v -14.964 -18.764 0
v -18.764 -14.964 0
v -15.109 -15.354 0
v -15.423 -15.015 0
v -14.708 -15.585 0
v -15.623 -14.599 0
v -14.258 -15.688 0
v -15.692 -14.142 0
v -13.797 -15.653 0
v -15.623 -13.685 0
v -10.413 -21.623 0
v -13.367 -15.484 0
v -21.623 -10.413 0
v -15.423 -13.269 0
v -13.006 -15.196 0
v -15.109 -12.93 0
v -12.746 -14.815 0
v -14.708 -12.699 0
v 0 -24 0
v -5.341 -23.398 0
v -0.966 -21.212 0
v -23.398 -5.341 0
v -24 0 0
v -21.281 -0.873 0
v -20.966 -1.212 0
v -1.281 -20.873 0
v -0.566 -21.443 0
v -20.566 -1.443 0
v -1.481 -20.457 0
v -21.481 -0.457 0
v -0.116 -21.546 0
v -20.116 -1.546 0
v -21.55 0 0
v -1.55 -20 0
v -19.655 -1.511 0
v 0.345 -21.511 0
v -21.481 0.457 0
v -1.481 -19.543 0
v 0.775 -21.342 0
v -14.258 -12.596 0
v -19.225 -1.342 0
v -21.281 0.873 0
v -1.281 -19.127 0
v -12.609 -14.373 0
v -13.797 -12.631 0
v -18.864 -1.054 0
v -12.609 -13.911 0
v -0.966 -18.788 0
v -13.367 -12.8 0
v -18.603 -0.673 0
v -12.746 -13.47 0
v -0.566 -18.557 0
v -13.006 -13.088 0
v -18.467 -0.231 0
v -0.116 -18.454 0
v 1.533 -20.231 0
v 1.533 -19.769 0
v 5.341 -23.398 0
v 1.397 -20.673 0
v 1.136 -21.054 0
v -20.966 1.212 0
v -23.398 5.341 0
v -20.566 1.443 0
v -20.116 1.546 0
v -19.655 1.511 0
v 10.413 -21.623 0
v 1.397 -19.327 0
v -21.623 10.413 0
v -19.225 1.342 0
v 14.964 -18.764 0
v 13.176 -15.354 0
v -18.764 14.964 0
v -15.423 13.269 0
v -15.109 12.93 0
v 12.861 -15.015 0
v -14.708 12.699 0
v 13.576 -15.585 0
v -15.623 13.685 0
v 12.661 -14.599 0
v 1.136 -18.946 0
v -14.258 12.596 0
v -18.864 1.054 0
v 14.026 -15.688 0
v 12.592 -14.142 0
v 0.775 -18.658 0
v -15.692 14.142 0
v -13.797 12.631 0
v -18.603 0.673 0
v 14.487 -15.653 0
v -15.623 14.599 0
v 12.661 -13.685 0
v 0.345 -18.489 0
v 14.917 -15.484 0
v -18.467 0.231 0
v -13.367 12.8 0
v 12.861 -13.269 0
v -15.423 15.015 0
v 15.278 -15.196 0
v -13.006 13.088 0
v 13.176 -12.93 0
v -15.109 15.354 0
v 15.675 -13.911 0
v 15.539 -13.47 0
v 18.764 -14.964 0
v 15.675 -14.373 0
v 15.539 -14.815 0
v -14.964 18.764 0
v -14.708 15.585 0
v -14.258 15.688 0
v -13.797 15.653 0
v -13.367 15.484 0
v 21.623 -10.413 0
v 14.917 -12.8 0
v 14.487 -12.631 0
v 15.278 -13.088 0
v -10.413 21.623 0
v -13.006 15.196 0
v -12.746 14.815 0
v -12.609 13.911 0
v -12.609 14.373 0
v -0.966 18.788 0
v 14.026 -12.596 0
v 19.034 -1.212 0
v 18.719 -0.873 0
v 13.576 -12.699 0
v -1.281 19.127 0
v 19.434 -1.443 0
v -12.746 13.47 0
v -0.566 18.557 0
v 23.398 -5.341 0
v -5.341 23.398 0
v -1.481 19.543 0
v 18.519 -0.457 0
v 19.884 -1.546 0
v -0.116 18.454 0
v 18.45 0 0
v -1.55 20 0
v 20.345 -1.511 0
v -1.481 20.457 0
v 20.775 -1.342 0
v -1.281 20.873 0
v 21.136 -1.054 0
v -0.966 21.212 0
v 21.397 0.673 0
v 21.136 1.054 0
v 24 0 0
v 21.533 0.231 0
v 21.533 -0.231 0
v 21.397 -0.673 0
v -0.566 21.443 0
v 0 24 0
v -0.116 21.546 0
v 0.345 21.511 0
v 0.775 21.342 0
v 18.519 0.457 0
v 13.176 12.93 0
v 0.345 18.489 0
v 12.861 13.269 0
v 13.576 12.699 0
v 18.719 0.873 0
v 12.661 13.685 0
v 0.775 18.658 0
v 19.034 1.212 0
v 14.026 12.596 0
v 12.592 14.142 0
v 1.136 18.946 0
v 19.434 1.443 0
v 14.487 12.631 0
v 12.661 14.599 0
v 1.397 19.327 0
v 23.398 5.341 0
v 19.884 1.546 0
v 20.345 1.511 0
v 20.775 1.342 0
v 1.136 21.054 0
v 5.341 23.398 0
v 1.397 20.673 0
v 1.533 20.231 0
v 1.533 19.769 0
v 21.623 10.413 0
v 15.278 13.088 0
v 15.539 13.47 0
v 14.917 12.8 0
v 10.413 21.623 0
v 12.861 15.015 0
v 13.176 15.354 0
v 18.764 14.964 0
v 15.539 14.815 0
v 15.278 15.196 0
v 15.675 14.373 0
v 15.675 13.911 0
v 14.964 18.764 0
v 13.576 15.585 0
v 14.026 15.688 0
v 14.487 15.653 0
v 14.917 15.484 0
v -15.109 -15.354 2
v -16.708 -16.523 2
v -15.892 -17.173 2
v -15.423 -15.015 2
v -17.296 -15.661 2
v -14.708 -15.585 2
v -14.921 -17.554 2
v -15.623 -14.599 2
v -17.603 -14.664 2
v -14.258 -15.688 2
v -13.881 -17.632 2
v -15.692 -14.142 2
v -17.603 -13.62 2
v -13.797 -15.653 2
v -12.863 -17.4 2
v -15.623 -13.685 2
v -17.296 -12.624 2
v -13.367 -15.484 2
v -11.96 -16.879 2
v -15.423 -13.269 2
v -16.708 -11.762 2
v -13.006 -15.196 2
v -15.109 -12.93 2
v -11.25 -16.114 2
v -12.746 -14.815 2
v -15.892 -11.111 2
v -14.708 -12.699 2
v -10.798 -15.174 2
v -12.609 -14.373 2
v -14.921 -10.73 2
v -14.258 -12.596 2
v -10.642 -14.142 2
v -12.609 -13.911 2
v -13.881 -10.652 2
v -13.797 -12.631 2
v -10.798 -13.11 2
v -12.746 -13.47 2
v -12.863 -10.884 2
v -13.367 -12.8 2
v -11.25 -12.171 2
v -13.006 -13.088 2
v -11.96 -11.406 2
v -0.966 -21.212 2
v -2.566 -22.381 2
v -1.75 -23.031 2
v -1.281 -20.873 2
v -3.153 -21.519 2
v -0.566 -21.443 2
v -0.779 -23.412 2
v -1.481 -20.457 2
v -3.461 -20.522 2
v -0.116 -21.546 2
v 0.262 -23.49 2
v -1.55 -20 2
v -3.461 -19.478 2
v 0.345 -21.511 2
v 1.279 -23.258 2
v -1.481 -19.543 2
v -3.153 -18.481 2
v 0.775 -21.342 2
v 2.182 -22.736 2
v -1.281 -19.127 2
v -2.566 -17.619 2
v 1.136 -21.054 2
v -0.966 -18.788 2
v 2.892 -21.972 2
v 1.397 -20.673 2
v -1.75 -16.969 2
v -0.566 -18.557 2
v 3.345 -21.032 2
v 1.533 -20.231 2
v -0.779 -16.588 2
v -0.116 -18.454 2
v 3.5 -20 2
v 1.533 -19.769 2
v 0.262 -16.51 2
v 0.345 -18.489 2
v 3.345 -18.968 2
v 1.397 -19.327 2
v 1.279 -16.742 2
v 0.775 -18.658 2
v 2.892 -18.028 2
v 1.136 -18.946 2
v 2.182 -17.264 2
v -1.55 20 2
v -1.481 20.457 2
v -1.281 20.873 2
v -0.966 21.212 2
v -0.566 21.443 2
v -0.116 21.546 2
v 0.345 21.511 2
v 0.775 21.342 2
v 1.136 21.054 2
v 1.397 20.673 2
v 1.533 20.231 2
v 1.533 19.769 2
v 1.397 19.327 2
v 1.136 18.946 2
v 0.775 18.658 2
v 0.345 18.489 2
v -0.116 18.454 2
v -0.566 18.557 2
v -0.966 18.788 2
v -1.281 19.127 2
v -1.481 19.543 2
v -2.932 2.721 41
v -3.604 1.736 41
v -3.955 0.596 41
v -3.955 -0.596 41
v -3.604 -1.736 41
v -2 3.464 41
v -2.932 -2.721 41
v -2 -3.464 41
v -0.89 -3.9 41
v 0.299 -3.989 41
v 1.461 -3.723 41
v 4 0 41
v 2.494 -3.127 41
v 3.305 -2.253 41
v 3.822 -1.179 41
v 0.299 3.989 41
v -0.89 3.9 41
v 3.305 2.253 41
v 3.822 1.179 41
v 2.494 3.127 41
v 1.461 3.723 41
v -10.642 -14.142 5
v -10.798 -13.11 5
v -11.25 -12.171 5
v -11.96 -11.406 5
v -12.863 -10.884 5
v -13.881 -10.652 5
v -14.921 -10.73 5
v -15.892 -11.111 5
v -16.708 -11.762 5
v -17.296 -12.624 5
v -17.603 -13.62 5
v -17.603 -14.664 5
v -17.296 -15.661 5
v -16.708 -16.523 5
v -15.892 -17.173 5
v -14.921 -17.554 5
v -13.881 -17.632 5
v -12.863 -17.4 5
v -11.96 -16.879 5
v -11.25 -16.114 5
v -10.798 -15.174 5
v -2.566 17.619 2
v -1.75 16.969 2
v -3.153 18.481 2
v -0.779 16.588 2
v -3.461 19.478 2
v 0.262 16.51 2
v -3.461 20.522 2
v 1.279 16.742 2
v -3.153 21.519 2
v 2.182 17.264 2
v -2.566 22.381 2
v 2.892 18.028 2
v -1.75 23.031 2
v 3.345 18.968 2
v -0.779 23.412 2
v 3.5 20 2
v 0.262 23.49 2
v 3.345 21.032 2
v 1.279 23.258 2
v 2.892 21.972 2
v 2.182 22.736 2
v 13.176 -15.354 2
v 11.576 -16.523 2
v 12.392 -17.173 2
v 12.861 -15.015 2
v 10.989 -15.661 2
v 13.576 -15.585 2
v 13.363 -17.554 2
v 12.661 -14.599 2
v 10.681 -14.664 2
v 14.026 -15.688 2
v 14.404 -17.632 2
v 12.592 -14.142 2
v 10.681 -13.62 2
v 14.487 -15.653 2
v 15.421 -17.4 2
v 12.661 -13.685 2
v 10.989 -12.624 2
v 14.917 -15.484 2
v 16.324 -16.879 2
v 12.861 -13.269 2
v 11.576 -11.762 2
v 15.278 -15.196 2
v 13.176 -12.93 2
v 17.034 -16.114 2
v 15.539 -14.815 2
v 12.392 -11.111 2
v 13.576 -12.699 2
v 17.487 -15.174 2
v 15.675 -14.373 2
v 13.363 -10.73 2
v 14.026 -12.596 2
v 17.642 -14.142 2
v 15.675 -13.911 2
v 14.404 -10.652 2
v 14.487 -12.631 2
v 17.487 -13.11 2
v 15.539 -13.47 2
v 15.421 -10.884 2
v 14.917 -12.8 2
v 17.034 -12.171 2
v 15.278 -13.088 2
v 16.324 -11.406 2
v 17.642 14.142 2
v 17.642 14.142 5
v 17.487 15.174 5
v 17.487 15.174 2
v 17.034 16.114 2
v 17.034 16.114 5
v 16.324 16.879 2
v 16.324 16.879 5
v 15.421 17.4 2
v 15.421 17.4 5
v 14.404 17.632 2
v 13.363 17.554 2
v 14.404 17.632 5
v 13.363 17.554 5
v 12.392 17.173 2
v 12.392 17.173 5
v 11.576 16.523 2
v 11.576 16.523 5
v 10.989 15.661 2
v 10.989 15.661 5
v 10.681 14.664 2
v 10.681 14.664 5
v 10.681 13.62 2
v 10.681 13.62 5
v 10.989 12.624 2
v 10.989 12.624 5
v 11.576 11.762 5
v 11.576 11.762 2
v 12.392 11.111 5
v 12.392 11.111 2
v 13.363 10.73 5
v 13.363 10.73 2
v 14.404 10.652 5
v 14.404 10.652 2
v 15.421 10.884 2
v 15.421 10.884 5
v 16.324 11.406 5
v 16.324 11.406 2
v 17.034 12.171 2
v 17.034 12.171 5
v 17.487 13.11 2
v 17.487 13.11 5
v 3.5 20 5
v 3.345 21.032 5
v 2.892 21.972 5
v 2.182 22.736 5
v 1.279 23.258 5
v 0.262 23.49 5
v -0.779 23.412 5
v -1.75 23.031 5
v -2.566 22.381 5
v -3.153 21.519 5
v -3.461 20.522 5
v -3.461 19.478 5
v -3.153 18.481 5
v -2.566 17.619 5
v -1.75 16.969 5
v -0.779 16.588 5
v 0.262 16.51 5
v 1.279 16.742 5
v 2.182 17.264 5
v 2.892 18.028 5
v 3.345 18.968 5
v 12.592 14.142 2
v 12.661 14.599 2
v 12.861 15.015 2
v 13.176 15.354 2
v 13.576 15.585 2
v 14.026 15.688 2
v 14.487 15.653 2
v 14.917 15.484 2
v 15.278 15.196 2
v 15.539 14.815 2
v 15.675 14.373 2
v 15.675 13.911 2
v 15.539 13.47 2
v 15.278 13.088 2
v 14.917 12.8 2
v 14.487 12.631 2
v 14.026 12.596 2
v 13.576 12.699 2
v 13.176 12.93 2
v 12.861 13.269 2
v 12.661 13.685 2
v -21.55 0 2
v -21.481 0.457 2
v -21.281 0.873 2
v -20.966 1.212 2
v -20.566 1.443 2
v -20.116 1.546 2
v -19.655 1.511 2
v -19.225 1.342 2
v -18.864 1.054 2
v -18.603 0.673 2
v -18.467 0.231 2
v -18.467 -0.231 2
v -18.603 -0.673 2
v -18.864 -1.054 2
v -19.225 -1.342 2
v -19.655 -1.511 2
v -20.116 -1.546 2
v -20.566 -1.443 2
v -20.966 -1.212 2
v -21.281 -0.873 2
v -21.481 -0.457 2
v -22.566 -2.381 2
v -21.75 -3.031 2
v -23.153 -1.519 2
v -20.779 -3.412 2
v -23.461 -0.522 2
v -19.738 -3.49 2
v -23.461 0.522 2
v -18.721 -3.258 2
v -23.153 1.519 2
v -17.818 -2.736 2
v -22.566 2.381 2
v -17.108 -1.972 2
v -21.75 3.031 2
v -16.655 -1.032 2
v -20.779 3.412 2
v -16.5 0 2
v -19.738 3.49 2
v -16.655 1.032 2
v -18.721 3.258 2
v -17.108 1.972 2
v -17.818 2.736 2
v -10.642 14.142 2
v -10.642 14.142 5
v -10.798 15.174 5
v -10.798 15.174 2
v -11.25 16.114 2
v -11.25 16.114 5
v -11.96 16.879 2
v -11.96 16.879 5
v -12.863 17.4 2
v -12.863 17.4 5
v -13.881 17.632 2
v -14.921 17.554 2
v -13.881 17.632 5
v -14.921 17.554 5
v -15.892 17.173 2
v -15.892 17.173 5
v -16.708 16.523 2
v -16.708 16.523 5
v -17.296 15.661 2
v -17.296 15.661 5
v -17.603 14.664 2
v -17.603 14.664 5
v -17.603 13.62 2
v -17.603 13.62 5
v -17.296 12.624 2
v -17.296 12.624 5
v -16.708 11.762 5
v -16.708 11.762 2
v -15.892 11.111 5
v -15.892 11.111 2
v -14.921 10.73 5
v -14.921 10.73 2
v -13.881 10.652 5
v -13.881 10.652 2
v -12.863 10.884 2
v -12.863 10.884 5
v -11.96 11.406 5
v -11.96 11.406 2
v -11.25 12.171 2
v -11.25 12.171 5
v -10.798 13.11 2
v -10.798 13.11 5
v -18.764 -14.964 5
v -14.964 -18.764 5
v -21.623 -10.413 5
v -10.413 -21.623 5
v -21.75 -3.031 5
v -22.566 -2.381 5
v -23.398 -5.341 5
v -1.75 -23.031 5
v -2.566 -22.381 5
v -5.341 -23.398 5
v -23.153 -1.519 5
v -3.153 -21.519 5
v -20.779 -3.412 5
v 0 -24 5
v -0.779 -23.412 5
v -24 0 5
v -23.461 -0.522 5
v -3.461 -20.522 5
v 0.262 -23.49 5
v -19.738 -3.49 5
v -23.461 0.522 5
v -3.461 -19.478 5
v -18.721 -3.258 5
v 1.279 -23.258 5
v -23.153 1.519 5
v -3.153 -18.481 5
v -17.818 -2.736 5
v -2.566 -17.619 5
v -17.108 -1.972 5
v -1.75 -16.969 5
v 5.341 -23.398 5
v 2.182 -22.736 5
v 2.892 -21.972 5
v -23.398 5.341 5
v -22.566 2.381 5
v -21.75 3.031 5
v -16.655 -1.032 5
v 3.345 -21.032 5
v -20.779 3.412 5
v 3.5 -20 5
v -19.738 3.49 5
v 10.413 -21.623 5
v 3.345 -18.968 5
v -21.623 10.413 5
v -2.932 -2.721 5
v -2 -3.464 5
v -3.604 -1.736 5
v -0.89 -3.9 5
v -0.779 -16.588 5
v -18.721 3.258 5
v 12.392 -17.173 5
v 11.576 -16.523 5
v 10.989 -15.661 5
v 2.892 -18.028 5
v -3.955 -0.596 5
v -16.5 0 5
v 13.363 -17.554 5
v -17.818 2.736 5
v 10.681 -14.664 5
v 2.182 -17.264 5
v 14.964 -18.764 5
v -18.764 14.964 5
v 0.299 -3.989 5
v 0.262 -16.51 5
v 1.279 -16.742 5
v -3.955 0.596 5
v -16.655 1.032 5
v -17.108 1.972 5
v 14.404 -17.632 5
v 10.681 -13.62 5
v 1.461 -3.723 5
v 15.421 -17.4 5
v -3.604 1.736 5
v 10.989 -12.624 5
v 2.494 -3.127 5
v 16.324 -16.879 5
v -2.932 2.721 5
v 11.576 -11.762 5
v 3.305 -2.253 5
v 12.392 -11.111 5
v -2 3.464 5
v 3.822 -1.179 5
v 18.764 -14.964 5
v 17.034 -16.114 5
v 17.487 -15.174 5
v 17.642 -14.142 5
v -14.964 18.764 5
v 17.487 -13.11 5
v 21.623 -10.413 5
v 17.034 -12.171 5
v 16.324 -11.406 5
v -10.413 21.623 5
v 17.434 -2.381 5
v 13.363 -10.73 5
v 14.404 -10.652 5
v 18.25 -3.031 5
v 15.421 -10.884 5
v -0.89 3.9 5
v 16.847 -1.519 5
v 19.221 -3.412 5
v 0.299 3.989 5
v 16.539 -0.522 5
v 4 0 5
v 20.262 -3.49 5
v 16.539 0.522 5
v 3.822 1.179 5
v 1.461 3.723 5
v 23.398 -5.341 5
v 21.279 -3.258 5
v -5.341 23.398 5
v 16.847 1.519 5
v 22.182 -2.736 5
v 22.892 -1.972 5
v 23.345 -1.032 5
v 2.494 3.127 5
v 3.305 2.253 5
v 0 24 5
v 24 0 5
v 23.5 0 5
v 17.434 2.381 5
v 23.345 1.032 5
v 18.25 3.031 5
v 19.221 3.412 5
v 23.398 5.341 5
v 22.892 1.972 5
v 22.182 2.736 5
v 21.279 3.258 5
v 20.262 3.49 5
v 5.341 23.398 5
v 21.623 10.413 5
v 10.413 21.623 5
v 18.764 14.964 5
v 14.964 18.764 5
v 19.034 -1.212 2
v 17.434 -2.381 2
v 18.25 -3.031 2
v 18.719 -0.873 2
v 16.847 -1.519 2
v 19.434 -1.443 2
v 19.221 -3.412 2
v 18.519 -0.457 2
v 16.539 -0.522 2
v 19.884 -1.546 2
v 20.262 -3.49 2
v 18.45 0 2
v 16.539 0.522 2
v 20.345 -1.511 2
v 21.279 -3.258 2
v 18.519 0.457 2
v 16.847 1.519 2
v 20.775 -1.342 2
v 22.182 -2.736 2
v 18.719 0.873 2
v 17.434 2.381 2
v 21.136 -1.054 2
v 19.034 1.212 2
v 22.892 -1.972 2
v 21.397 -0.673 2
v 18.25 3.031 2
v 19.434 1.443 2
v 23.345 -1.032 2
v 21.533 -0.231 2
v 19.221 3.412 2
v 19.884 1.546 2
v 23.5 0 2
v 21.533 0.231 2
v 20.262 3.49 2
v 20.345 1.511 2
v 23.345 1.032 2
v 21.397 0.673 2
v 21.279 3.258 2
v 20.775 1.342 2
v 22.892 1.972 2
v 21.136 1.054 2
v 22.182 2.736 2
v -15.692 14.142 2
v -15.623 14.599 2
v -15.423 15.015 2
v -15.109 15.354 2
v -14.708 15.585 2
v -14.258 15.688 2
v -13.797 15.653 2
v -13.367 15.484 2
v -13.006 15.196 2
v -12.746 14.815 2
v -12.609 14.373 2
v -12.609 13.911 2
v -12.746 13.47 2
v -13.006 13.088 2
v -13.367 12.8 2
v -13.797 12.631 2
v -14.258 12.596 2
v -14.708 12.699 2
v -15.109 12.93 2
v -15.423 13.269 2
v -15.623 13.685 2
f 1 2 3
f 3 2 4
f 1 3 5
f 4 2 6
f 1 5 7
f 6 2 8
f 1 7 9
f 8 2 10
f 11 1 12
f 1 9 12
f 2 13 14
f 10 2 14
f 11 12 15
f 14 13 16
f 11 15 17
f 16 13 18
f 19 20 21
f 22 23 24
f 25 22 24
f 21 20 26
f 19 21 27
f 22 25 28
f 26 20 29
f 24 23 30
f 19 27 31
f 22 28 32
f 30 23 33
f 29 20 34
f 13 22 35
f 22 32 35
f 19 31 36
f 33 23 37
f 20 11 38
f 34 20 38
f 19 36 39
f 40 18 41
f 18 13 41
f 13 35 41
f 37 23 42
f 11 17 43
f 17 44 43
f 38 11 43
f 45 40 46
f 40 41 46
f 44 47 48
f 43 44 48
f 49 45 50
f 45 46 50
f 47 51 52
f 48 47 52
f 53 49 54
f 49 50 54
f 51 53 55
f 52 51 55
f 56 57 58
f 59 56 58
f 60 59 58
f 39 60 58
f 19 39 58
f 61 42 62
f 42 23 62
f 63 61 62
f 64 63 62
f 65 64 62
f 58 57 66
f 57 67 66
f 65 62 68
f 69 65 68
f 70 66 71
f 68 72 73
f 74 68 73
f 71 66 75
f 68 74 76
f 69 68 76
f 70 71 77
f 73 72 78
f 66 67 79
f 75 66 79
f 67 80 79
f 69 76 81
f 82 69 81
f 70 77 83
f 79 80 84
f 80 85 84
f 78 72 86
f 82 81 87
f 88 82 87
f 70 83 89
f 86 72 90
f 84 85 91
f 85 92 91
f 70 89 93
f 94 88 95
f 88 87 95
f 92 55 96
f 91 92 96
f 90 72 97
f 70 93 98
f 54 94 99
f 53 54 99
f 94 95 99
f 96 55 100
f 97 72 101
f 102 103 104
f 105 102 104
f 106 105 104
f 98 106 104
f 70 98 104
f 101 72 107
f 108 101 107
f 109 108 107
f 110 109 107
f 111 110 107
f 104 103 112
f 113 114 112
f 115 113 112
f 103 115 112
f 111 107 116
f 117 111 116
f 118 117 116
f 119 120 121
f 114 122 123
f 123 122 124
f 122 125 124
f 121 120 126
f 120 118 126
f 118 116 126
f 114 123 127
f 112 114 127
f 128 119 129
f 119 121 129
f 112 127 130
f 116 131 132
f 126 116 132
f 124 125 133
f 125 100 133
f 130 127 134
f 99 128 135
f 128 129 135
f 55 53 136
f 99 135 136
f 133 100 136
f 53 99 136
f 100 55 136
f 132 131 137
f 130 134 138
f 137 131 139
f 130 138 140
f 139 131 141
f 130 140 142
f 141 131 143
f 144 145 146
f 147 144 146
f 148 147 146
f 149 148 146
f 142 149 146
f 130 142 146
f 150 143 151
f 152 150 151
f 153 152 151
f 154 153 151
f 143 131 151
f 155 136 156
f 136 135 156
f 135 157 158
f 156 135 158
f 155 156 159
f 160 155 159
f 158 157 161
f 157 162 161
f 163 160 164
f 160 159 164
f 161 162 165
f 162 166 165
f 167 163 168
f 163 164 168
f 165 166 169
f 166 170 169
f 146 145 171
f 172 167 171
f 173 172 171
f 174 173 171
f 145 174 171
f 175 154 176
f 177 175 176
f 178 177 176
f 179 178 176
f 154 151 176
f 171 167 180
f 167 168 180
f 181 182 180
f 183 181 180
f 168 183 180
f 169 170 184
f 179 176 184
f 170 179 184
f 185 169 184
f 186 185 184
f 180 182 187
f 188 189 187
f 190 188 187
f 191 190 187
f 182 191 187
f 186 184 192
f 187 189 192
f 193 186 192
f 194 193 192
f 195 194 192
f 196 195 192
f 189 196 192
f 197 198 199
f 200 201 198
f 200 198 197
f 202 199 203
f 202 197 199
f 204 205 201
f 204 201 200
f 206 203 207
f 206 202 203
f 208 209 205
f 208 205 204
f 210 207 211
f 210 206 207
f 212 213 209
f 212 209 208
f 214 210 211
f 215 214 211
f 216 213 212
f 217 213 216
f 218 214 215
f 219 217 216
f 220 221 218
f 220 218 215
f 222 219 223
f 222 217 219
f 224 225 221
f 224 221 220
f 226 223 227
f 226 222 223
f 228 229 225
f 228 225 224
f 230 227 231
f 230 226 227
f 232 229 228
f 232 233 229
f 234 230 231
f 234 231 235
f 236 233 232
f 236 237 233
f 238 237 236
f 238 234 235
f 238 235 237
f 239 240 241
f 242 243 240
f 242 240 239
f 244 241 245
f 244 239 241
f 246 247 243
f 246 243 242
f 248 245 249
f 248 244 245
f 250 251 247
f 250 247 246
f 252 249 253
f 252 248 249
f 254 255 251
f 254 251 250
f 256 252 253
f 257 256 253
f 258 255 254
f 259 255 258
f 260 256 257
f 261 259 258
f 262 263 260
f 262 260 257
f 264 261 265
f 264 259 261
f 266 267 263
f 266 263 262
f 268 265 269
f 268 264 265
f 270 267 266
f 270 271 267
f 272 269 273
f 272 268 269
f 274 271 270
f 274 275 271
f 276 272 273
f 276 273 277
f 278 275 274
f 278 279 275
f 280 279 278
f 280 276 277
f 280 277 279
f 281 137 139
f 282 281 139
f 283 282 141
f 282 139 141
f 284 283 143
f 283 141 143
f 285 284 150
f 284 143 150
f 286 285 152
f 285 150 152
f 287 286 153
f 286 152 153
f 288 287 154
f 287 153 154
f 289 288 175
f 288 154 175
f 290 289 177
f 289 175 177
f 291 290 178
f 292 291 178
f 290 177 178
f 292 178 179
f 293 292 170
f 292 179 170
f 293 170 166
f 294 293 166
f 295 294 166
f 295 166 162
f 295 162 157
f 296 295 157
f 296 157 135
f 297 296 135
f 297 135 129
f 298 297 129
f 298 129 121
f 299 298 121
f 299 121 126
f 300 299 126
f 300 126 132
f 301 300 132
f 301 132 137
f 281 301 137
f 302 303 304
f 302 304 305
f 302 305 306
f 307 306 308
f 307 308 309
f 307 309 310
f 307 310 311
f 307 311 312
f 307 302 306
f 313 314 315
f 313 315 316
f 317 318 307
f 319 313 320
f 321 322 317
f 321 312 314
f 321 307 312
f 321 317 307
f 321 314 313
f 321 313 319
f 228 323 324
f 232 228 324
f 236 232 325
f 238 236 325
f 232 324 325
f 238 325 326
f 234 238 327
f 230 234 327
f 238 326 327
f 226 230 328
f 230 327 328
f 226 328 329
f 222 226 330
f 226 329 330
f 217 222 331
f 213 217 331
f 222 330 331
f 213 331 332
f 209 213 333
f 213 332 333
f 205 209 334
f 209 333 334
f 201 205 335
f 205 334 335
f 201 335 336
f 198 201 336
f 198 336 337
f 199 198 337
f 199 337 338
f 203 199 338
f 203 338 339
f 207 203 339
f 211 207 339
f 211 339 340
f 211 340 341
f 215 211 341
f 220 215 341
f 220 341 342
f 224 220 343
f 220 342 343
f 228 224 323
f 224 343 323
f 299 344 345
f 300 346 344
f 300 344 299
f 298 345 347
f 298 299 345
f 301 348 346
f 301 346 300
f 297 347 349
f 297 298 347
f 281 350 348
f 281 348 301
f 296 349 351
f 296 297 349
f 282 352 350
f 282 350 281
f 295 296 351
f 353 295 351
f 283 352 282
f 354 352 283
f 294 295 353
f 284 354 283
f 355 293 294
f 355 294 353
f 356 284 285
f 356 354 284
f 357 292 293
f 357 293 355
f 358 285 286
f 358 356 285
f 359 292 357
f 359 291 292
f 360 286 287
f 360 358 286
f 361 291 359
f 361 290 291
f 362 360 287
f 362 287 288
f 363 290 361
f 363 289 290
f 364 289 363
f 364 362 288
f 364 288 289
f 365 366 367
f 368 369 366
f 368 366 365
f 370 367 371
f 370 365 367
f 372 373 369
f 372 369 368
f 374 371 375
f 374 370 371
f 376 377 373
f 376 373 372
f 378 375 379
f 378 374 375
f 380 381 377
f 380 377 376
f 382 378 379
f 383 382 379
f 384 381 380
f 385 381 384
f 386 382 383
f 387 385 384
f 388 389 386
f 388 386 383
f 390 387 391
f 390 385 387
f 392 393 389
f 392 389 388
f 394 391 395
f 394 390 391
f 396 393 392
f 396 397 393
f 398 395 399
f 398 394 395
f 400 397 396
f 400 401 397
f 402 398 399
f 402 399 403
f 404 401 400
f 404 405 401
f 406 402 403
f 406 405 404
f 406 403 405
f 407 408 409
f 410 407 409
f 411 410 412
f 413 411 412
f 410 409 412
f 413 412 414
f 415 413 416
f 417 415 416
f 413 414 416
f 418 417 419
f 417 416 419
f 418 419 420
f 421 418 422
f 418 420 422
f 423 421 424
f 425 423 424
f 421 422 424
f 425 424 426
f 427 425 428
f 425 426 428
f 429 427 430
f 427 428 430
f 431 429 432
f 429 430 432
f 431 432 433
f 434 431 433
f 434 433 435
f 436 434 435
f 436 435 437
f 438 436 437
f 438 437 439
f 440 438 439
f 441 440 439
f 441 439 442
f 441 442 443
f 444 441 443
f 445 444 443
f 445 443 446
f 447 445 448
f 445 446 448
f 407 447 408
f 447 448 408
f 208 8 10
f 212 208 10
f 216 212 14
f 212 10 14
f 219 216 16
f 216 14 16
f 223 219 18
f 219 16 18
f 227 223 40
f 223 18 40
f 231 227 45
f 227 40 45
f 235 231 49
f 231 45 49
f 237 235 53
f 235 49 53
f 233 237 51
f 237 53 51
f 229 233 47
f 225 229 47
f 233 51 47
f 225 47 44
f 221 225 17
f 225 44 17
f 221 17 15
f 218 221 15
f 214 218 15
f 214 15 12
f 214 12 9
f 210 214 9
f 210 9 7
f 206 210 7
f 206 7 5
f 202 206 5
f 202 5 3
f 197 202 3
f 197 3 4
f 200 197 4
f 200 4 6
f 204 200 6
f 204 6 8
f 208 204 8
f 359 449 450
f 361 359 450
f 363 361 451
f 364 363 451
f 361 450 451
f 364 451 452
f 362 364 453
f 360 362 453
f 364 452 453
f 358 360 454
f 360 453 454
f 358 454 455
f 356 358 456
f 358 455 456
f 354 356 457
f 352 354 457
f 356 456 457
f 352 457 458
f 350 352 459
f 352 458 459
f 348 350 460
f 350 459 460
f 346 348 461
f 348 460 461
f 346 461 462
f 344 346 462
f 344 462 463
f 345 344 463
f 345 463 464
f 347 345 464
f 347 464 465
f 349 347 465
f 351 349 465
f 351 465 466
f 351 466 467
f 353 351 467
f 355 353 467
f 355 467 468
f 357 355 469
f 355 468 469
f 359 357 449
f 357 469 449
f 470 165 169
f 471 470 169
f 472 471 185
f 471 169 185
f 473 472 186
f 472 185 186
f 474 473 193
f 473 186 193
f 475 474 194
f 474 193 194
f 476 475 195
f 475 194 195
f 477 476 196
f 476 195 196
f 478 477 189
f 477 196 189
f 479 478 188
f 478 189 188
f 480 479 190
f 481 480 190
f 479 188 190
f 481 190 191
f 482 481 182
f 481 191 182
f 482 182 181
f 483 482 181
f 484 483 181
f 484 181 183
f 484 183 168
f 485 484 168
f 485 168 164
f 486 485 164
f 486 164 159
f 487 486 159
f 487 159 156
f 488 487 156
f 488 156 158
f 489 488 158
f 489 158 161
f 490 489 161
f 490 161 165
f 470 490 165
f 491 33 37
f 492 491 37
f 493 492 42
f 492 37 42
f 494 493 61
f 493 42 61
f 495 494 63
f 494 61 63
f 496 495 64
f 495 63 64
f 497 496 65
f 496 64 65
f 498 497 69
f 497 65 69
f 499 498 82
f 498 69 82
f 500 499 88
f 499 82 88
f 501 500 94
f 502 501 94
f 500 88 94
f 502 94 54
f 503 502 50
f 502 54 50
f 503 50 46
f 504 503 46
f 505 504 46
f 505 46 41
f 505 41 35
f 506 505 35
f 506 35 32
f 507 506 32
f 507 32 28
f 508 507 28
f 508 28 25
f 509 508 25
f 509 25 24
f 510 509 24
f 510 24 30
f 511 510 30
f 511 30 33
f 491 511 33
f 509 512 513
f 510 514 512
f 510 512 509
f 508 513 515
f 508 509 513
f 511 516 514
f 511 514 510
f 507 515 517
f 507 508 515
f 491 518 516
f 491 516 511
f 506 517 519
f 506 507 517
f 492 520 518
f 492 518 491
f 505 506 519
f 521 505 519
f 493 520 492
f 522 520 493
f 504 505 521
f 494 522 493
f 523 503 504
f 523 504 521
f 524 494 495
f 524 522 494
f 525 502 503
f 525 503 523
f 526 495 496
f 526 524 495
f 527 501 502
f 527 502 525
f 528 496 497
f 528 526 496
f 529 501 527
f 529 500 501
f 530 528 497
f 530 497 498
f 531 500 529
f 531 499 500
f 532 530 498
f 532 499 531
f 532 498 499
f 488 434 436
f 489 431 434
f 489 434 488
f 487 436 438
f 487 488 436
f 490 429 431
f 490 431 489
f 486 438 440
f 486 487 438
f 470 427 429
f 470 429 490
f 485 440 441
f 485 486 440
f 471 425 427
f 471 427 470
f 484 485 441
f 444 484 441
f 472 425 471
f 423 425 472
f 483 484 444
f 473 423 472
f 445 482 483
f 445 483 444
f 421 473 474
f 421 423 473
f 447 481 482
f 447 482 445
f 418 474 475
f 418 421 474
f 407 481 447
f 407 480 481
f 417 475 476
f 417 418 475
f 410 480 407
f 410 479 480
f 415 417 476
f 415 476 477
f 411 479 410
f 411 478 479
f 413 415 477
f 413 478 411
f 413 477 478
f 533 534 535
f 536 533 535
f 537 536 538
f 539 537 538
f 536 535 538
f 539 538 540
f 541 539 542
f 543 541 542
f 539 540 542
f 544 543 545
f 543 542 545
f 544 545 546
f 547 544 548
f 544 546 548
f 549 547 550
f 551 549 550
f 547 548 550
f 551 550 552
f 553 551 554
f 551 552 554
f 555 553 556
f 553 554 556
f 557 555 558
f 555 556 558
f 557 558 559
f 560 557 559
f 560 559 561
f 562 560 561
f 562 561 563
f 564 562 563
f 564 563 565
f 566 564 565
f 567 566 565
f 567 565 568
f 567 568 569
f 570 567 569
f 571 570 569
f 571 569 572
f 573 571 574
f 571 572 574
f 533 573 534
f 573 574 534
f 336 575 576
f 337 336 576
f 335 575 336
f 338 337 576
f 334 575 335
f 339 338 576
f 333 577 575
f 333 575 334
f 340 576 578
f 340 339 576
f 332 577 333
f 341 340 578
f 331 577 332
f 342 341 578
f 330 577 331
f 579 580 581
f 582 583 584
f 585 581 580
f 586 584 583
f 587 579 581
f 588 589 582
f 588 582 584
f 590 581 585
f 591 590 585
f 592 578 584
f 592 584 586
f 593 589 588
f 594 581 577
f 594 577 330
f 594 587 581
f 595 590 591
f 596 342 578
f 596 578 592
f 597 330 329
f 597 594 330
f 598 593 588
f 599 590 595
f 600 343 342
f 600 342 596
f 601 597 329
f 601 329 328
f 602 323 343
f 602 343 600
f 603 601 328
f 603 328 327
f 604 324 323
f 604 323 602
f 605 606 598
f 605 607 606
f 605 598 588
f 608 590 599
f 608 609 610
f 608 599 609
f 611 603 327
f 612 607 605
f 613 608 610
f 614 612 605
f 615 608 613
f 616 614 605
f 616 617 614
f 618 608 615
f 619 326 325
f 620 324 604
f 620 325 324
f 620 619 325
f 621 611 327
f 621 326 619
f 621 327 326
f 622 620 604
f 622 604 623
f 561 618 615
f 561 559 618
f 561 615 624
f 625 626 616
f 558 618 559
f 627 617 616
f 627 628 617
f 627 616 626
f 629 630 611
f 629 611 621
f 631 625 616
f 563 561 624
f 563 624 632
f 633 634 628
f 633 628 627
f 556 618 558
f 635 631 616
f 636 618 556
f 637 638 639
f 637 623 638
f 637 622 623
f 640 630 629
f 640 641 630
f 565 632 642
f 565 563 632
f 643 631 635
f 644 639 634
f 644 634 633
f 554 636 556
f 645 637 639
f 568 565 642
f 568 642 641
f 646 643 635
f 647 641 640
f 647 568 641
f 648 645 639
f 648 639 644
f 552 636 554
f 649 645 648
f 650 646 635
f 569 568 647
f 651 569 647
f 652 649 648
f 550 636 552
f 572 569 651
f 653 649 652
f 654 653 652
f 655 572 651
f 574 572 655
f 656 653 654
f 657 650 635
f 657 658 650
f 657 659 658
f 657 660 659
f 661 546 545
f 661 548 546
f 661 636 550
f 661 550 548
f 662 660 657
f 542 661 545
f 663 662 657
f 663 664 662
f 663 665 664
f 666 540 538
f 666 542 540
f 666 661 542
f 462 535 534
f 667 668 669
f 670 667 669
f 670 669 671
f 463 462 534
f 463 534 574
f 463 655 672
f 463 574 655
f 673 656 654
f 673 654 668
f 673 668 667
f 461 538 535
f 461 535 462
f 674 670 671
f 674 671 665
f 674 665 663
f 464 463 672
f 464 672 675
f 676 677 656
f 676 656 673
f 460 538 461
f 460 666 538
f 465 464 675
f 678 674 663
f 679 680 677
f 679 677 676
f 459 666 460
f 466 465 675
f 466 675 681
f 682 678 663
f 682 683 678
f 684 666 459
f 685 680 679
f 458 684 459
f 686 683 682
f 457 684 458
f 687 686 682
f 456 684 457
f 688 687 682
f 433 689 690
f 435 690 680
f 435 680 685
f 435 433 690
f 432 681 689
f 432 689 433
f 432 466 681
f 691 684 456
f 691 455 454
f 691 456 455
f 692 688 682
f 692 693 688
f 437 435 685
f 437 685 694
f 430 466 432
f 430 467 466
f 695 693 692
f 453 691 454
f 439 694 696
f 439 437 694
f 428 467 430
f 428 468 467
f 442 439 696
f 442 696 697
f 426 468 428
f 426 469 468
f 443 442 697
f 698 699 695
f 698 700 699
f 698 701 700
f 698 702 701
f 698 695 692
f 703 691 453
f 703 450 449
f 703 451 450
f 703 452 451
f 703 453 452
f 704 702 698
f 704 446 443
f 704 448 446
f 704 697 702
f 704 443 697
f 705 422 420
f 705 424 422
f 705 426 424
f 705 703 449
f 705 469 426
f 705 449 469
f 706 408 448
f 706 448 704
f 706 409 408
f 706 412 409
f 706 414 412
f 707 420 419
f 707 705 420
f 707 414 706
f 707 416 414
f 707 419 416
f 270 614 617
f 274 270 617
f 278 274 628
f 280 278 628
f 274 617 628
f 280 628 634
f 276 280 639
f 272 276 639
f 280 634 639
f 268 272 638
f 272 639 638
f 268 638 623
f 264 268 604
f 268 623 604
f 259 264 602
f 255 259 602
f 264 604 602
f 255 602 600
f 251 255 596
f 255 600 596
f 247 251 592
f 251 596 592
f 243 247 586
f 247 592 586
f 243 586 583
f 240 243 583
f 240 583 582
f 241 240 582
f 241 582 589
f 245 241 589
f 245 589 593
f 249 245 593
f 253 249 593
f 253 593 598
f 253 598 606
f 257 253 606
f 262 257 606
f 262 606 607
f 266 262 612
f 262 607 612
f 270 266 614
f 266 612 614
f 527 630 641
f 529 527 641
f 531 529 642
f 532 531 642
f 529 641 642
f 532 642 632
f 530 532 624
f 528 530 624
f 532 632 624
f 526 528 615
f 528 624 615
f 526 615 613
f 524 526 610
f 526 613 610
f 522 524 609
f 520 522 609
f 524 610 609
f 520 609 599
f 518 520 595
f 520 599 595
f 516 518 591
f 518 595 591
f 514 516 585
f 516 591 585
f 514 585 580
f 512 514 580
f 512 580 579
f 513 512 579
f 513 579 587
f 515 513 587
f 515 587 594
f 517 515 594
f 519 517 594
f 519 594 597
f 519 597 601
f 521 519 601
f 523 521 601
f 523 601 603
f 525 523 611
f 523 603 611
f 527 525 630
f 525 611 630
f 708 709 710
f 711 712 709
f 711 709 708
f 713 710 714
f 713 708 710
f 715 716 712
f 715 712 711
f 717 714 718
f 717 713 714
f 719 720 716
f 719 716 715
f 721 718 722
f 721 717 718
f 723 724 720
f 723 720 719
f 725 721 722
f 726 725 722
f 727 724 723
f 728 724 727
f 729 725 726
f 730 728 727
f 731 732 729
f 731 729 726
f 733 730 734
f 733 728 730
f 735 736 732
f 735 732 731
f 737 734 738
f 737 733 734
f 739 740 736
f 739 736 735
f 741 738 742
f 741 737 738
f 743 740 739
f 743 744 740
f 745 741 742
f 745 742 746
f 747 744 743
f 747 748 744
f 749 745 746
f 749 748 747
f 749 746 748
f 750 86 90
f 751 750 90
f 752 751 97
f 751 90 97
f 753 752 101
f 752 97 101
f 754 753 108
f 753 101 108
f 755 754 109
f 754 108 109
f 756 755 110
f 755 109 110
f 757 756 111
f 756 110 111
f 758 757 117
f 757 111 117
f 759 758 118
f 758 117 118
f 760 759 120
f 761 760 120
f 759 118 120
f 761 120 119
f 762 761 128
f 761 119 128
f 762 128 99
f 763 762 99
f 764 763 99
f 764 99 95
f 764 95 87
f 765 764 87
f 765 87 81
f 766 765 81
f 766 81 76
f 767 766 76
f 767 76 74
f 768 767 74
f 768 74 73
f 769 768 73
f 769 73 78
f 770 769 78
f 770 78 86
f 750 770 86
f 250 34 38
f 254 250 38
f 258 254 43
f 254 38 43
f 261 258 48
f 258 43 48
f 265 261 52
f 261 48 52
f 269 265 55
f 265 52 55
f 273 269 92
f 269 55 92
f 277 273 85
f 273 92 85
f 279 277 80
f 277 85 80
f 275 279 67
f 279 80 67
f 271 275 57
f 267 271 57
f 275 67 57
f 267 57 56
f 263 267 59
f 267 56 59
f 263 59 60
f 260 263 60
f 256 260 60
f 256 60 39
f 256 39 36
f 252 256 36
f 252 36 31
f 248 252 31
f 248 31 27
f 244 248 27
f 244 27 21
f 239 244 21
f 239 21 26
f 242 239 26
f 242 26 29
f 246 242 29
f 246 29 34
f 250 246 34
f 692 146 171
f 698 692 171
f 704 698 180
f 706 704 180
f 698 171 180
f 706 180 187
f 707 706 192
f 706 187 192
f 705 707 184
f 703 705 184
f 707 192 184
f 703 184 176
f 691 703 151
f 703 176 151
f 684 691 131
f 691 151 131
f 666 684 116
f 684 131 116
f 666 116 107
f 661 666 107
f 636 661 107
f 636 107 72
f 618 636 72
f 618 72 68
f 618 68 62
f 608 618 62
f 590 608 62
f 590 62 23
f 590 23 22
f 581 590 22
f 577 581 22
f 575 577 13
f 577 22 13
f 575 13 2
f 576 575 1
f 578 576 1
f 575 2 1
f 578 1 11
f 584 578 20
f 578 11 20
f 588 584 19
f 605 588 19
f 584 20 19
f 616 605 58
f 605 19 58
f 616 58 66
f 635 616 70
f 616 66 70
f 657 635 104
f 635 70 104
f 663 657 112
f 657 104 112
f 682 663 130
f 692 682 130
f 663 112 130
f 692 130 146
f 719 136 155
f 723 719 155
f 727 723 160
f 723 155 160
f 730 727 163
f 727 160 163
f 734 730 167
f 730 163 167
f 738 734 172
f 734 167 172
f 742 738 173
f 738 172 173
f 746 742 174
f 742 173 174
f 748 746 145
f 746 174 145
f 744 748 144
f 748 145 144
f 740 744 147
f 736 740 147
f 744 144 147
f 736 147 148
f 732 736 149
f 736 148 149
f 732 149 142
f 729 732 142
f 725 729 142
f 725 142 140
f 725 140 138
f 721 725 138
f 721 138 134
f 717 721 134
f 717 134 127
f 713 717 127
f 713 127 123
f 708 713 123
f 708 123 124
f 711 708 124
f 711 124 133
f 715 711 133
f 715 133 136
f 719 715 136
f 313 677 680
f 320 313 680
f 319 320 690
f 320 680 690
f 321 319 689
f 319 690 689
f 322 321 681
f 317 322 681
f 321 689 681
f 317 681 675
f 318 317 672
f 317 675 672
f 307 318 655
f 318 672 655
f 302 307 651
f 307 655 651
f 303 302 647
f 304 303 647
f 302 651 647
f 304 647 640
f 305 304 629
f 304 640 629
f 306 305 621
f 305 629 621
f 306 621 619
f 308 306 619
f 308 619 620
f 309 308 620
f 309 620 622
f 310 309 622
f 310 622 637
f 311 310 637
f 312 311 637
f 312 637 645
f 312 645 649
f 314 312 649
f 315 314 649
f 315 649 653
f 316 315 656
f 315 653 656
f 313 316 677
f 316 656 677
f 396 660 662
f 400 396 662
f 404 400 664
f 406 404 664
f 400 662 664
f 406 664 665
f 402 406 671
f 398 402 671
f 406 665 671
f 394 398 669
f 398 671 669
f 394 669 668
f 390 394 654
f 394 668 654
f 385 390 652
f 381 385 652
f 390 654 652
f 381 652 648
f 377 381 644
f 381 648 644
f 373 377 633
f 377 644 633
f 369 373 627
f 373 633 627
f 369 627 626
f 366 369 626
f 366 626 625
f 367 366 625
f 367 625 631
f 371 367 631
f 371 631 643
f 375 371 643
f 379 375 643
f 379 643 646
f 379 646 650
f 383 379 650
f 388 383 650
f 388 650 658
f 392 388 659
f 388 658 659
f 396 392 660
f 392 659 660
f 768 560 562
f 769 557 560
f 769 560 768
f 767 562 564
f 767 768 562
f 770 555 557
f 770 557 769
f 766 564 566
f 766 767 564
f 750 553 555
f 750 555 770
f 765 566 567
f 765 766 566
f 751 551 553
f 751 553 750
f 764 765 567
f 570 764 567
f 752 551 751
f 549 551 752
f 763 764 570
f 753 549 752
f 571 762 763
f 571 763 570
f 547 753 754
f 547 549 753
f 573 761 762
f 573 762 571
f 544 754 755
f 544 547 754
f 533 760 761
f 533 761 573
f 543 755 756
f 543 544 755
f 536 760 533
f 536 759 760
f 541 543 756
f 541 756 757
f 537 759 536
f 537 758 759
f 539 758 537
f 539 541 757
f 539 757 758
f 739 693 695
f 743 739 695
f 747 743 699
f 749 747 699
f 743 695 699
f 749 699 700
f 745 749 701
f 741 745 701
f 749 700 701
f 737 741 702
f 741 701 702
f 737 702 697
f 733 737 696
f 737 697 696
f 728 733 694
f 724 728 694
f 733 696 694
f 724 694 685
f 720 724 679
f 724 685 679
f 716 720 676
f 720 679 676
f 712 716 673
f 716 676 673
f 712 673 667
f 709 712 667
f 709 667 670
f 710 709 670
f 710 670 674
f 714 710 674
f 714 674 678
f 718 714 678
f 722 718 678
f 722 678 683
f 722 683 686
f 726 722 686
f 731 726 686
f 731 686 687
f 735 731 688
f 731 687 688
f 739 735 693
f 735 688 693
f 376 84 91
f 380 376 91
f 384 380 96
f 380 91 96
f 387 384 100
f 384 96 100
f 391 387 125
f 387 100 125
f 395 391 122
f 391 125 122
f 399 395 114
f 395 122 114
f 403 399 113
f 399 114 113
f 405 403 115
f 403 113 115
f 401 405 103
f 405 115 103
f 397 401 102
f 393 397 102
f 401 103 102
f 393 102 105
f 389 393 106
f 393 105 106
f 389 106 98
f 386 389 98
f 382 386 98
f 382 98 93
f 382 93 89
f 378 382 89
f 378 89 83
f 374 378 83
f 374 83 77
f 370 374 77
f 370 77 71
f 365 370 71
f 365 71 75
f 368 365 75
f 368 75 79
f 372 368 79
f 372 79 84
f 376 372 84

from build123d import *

# Parameters (mm, degrees)
SKETCH6_R           = 24
BOSS_EXTRUDE1_DEPTH = 5
SKETCH8_R           = 1.55
CUT_EXTRUDE6_DEPTH  = 5
SKETCH10_R          = 4
BOSS_EXTRUDE2_DEPTH = 36
SKETCH11_R          = 3.5
CUT_EXTRUDE8_DEPTH  = 3


with BuildPart() as part:
    # Sketch6 → Boss-Extrude1 (new body)
    with BuildSketch(Plane.XY):
        Circle(SKETCH6_R)
    extrude(amount=BOSS_EXTRUDE1_DEPTH)

    # Sketch8 → Cut-Extrude6 (cut)
    with BuildSketch(Plane(origin=(0, 0, 0), x_dir=(-1, 0, 0), z_dir=(0, 0, -1))):
        with Locations((0, 20)):
            Circle(SKETCH8_R)
        with Locations((14.142135624, 14.142135624)):
            Circle(SKETCH8_R)
        with Locations((20, 0)):
            Circle(SKETCH8_R)
        with Locations((14.142135624, -14.142135624)):
            Circle(SKETCH8_R)
        with Locations((0, -20)):
            Circle(SKETCH8_R)
        with Locations((-14.142135624, -14.142135624)):
            Circle(SKETCH8_R)
        with Locations((-20, 0)):
            Circle(SKETCH8_R)
        with Locations((-14.142135624, 14.142135624)):
            Circle(SKETCH8_R)
    extrude(amount=-CUT_EXTRUDE6_DEPTH, mode=Mode.SUBTRACT)

    # Sketch10 → Boss-Extrude2 (add)
    with BuildSketch(Plane.XY.offset(5)):
        Circle(SKETCH10_R)
    extrude(amount=BOSS_EXTRUDE2_DEPTH)

    # Sketch11 → Cut-Extrude8 (cut)
    with BuildSketch(Plane.XY.offset(5)):
        with Locations((0, 20)):
            Circle(SKETCH11_R)
        with Locations((14.142135624, 14.142135624)):
            Circle(SKETCH11_R)
        with Locations((20, 0)):
            Circle(SKETCH11_R)
        with Locations((14.142135624, -14.142135624)):
            Circle(SKETCH11_R)
        with Locations((0, -20)):
            Circle(SKETCH11_R)
        with Locations((-14.142135624, -14.142135624)):
            Circle(SKETCH11_R)
        with Locations((-20, 0)):
            Circle(SKETCH11_R)
        with Locations((-14.142135624, 14.142135624)):
            Circle(SKETCH11_R)
    extrude(amount=-CUT_EXTRUDE8_DEPTH, mode=Mode.SUBTRACT)


solid = part.part
